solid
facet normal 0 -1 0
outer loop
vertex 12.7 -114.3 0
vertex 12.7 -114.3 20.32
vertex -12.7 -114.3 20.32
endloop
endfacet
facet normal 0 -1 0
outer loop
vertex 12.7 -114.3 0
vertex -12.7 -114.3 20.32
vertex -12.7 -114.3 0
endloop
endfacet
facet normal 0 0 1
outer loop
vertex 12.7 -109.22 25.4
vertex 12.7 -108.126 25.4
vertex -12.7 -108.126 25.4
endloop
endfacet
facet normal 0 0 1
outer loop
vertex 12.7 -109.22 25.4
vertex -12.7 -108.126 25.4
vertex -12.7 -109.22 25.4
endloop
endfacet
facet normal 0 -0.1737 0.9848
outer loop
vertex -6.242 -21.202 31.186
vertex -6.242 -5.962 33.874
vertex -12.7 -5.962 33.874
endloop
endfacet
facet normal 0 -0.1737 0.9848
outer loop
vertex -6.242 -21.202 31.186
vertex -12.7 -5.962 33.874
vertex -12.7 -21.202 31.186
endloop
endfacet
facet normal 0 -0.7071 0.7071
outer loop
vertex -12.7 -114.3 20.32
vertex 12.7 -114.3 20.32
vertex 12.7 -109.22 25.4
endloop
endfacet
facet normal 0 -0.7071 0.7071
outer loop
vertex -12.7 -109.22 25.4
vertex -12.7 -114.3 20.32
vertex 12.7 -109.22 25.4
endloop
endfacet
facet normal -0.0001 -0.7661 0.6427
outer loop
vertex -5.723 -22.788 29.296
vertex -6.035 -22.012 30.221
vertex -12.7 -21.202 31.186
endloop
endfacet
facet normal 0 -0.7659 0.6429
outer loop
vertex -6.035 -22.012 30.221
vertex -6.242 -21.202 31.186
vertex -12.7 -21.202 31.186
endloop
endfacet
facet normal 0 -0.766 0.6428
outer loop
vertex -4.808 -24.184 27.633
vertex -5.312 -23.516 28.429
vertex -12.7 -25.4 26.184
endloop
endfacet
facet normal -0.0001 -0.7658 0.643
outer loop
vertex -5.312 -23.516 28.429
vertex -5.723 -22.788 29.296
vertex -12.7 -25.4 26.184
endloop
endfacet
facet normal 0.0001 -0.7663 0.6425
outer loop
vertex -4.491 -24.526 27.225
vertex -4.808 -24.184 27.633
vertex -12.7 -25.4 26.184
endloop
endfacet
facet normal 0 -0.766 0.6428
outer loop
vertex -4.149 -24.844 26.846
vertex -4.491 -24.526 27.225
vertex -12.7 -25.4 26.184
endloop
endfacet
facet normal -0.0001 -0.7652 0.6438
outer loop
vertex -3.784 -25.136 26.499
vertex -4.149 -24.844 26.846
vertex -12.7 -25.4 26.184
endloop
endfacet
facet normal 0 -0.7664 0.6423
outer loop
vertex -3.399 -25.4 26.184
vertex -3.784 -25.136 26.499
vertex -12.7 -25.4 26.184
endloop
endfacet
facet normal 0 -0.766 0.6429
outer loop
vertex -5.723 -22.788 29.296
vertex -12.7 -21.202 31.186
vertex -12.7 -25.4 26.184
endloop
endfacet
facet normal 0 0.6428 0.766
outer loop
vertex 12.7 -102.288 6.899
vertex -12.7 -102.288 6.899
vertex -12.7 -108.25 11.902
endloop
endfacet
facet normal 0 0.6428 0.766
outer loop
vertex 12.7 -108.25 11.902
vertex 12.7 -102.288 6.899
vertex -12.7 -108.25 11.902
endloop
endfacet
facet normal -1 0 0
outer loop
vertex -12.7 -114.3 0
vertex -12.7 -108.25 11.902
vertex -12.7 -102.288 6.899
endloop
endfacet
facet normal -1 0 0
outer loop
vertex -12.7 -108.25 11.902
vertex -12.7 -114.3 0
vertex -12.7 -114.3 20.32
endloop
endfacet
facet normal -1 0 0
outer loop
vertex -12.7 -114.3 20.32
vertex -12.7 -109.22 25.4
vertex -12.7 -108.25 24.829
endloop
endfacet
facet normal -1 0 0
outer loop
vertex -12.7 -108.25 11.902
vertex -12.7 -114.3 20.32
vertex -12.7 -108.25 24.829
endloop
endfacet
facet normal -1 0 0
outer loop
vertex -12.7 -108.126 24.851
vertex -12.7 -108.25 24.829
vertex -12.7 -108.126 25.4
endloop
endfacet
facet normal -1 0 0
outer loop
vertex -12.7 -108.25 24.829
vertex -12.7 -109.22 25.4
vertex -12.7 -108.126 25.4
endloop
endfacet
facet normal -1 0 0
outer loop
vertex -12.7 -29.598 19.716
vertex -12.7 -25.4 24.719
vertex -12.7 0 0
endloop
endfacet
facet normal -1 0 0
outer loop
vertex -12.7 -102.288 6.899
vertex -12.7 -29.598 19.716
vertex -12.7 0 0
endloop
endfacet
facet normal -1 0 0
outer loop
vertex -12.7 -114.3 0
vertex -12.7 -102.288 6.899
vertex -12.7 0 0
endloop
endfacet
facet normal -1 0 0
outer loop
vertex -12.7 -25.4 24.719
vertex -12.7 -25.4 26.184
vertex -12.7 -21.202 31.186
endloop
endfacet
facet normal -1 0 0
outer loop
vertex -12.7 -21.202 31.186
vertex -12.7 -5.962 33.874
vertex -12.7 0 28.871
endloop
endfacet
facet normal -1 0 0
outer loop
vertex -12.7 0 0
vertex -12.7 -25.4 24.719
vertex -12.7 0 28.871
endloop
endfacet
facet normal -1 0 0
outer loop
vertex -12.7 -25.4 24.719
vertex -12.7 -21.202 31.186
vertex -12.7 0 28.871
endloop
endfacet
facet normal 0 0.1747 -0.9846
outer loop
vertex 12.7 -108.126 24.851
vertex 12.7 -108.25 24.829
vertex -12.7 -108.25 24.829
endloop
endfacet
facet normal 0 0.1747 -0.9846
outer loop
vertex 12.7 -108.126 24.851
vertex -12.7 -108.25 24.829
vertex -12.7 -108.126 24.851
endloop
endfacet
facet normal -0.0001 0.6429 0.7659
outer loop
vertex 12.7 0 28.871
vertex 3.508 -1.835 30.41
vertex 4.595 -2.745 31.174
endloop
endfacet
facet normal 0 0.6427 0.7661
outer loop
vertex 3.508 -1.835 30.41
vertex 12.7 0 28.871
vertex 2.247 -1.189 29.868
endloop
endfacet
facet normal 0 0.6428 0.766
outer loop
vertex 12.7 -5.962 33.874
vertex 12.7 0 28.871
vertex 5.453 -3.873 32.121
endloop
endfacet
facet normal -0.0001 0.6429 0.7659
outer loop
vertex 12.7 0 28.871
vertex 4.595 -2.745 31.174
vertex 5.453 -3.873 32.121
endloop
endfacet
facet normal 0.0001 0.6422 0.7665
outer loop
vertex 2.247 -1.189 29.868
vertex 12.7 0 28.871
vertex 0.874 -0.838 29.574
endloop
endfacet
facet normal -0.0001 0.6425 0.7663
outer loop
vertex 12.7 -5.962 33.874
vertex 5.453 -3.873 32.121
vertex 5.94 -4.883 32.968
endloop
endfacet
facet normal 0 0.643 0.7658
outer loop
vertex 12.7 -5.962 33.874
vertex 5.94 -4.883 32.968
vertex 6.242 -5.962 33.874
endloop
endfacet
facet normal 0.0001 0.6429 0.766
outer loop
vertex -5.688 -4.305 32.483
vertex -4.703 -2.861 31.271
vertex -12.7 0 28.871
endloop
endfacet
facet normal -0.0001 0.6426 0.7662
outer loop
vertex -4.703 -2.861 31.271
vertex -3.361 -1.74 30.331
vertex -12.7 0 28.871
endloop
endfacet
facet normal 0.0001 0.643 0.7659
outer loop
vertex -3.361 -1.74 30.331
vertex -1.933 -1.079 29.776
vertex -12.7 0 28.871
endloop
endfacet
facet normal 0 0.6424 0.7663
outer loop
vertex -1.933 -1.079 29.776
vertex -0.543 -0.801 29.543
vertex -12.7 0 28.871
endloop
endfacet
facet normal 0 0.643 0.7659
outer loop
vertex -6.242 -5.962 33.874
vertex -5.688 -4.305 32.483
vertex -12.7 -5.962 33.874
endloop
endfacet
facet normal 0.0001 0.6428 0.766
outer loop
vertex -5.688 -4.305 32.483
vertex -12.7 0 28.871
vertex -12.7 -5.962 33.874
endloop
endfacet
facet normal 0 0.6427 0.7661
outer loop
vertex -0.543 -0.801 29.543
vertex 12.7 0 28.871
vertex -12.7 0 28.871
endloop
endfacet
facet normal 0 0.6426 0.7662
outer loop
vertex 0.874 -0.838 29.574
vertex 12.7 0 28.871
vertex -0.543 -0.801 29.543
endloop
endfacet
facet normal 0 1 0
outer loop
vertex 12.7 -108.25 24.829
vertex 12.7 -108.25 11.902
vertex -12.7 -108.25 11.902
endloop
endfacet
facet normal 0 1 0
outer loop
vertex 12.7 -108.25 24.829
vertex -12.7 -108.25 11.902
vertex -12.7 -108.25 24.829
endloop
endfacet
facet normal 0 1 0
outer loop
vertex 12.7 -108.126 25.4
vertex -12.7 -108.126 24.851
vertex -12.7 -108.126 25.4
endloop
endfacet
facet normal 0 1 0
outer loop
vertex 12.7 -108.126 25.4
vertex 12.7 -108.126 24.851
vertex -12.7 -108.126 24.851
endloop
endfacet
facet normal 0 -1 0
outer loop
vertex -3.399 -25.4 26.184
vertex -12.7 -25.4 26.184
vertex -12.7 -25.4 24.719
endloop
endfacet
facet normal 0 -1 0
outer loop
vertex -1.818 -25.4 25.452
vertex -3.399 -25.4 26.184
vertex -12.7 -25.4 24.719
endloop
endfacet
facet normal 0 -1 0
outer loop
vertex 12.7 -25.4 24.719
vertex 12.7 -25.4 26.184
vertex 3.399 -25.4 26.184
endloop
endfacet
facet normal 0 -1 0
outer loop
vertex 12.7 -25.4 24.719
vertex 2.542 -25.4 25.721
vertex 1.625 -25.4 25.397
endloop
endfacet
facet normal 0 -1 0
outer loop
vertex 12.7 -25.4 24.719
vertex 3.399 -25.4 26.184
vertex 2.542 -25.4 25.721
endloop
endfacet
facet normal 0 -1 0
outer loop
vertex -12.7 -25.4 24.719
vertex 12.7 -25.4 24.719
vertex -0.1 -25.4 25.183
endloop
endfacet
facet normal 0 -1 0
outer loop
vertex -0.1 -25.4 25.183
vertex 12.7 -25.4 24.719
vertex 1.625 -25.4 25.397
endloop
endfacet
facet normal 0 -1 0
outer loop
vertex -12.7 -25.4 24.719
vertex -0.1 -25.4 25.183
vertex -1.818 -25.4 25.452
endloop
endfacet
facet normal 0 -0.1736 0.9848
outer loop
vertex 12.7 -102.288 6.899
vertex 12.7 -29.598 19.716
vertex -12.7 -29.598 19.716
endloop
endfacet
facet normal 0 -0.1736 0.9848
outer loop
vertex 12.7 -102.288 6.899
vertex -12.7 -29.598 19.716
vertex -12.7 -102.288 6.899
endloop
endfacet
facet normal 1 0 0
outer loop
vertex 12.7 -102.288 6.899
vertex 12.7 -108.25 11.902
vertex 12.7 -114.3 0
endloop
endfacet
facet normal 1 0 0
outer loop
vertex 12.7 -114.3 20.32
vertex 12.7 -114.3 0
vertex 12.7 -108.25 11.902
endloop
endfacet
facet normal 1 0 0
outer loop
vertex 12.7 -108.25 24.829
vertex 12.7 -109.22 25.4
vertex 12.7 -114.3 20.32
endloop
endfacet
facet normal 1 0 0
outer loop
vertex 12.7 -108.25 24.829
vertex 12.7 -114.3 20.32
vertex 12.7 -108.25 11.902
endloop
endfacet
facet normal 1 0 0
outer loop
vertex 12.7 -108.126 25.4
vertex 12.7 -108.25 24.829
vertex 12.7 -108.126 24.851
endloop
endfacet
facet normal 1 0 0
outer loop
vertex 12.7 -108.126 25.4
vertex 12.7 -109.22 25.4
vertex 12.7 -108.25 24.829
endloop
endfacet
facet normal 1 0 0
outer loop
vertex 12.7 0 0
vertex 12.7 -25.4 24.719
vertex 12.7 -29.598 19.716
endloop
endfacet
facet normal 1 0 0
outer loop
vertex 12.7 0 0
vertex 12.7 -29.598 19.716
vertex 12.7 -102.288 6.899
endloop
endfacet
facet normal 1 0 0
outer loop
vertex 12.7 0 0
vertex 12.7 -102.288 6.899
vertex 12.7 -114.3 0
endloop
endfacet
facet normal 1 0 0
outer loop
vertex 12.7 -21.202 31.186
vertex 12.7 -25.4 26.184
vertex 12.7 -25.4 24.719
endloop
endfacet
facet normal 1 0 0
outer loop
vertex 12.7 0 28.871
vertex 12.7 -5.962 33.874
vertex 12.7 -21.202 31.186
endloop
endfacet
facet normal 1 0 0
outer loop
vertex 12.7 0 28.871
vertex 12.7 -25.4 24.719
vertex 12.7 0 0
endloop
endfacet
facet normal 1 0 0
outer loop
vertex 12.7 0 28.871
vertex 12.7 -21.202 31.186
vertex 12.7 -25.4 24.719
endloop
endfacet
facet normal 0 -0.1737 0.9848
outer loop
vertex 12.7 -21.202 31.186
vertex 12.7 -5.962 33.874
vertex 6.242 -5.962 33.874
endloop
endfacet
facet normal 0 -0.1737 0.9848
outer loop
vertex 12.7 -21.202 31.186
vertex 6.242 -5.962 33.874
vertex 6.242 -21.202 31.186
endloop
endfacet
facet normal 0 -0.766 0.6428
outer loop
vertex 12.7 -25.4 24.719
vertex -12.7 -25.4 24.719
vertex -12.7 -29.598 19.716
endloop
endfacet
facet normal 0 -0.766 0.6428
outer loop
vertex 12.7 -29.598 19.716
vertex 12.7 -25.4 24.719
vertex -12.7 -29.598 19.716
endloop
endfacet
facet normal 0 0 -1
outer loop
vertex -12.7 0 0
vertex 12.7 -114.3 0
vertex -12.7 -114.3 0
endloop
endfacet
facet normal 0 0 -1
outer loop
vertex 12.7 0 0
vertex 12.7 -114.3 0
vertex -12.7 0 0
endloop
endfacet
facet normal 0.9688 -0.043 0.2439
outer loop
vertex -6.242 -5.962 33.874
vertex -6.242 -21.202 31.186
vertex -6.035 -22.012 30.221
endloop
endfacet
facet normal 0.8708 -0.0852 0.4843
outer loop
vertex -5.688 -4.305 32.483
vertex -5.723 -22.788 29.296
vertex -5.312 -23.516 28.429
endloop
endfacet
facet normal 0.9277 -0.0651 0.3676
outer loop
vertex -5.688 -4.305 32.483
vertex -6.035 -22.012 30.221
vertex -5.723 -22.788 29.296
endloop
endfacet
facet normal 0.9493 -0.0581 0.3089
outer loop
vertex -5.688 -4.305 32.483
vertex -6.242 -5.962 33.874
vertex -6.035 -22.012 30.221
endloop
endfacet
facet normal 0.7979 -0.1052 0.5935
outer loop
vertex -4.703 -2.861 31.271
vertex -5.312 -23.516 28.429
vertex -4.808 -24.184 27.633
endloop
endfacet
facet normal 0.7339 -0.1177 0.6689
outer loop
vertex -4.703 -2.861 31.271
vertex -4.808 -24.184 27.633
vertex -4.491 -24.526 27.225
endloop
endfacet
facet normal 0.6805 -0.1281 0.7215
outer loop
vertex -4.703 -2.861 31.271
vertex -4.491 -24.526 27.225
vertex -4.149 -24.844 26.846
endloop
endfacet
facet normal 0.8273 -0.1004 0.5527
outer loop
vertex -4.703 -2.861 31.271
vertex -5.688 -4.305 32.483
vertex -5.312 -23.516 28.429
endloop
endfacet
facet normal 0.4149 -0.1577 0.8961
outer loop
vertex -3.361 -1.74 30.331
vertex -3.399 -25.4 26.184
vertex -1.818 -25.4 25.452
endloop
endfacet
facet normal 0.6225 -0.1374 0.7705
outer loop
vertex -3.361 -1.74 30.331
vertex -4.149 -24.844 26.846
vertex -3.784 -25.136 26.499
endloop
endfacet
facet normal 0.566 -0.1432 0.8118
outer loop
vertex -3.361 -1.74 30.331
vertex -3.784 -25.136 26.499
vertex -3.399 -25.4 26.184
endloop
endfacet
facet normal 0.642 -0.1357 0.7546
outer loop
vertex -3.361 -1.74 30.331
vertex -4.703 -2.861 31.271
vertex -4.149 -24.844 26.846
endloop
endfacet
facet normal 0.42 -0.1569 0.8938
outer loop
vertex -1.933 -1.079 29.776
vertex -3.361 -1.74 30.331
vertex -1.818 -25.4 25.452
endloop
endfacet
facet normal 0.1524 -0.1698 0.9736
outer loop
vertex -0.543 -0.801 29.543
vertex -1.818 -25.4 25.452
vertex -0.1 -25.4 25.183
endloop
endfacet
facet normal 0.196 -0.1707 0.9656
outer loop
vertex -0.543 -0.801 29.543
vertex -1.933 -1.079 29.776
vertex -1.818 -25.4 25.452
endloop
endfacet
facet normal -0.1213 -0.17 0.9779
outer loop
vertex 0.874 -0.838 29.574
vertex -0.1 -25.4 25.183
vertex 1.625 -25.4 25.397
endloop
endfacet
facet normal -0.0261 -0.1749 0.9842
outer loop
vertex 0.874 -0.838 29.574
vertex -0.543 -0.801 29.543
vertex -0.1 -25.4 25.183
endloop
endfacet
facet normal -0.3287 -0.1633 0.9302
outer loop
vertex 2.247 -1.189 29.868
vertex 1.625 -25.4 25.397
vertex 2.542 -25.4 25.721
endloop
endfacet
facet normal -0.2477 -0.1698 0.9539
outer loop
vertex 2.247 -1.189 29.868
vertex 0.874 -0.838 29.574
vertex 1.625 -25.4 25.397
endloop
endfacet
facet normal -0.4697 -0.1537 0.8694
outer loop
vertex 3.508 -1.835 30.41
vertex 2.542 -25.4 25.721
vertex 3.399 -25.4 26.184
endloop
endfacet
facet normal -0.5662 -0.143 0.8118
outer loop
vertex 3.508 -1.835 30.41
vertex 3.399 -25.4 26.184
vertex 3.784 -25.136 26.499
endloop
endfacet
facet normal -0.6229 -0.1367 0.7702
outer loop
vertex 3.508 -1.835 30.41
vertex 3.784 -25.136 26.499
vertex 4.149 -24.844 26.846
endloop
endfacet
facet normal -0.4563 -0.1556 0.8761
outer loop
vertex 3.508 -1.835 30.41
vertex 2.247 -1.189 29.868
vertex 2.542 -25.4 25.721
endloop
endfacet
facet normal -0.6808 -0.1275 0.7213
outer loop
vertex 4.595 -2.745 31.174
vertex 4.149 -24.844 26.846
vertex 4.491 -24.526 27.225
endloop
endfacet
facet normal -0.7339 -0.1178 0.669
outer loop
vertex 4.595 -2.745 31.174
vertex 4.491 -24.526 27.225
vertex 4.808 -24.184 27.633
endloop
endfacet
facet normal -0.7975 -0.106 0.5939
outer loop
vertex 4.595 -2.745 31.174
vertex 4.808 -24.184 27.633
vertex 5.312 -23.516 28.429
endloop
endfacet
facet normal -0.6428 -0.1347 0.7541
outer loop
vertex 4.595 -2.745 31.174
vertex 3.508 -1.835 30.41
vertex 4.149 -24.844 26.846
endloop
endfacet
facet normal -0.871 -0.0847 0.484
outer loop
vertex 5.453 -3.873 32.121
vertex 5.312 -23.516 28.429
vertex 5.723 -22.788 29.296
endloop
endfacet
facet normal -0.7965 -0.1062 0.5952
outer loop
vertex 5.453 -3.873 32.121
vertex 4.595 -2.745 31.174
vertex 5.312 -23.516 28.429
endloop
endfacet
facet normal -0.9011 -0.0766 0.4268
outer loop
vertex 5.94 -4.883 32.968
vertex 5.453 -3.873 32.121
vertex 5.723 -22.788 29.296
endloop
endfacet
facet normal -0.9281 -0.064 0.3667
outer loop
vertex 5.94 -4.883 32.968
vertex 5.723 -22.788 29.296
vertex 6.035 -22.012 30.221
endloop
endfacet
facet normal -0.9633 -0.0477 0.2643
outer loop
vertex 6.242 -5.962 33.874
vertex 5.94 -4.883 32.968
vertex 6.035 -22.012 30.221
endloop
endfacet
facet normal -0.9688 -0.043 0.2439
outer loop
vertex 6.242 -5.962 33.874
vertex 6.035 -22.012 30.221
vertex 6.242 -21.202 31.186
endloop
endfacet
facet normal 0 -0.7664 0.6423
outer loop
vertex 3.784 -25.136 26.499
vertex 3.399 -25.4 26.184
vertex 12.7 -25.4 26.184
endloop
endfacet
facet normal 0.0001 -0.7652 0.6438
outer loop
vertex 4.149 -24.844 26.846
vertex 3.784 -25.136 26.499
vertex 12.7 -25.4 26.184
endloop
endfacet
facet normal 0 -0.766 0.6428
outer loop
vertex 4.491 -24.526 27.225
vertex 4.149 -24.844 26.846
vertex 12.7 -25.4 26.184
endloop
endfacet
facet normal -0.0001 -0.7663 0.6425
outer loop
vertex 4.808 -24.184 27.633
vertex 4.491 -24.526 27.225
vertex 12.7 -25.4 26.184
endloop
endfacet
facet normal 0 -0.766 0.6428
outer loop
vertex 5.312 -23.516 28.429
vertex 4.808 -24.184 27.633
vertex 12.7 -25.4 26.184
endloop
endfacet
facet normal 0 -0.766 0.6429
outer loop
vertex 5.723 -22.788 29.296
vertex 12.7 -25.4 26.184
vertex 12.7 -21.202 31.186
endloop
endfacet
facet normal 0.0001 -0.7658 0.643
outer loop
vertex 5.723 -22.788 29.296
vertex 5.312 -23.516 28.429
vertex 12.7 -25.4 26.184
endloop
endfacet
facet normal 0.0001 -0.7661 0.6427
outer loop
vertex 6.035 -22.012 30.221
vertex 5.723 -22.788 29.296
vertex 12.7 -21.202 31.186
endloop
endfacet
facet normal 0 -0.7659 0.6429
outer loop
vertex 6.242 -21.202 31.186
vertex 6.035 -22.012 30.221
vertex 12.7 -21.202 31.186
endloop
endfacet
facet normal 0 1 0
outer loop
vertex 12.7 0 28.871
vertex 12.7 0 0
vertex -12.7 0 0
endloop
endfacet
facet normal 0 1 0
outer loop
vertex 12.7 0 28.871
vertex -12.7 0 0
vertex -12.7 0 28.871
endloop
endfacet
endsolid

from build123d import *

# Parameters (mm, degrees)
F1_DEPTH     = 12.7
F3_R         = 6.35
F4_DEPTH     = 104.14
F5_T1_DEPTH  = 25.4
F5_T3_DEPTH  = 51.5282991577
F5_T5_DEPTH  = 37.3912990947
F5_T7_DEPTH  = 28.55897566
F5_T9_DEPTH  = 28.55897566
F5_T11_DEPTH = 37.3912990947


# Not quite as in the source:
# - a fillet or chamfer that OpenCascade refuses, or shapes differently, is made with other operations: its cross-section is extruded or revolved along the edge and cut away or added


with BuildPart() as f1:
    # F0 (on Right) → F1 (new body, symmetric)
    with BuildSketch(Plane.YZ):
        Polygon((-114.3, 25.4), (-114.3, 0), (0, 0), (0, 34.925), (-25.4, 30.44629469), (-25.4, 20.4565655141), (-108.2500742316, 5.8478620733), (-108.2500742316, 24.8292279061), (-108.1259697676, 24.8511108716), (-108.1259697676, 25.4), align=None)
    extrude(amount=F1_DEPTH, both=True)

    # F3 (on face) → F4 (cut)
    with BuildSketch(Plane(origin=(0, 5.9725267528, 1.0531176095), x_dir=(1, 0, 0), z_dir=(0, -0.984807753, -0.1736481777))):
        with Locations((0, 35.56)):
            Circle(F3_R)
    extrude(amount=F4_DEPTH, mode=Mode.SUBTRACT)

    # F5: chamfer of 5.08 on 7 edges, made by hand

    # F5_s2 → F5_t1 (join)
    with BuildSketch(Plane.YZ.offset(-12.7)):
        Polygon((-25.4, 24.7191916404), (-29.5978672575, 19.7163682551), (-25.4, 20.4565655141), align=None)
        Polygon((-102.2879414891, 6.8991469384), (-108.2500742316, 11.9019703237), (-108.2500742316, 5.8478620733), align=None)
    extrude(amount=F5_T1_DEPTH)

    # F5_s4 → F5_t3 (cut)
    with BuildSketch(Plane.YZ.offset(-25.7641495789)):
        Polygon((-114.3, 20.32), (-109.22, 25.4), (-114.3, 25.4), align=None)
    extrude(amount=F5_T3_DEPTH, mode=Mode.SUBTRACT)

    # F5_s6 → F5_t5 (cut)
    with BuildSketch(Plane.YZ.offset(-28.1667031257)):
        Polygon((0, 28.8708917496), (-5.9621327425, 33.8737151349), (0, 34.925), align=None)
    extrude(amount=F5_T5_DEPTH, mode=Mode.SUBTRACT)

    # F5_s8 → F5_t7 (cut)
    with BuildSketch(Plane.YZ.offset(-4.8084342517)):
        Polygon((-25.4, 26.1836685636), (-21.2021327425, 31.1864919489), (-25.4, 30.44629469), align=None)
    extrude(amount=F5_T7_DEPTH, mode=Mode.SUBTRACT)

    # F5_s10 → F5_t9 (cut)
    with BuildSketch(Plane.YZ.offset(-23.7505414084)):
        Polygon((-21.2021327425, 31.1864919489), (-25.4, 26.1836685636), (-25.4, 30.44629469), align=None)
    extrude(amount=F5_T9_DEPTH, mode=Mode.SUBTRACT)

    # F5_s12 → F5_t11 (cut)
    with BuildSketch(Plane.YZ.offset(-9.224595969)):
        Polygon((0, 28.8708917496), (-5.9621327425, 33.8737151349), (0, 34.925), align=None)
    extrude(amount=F5_T11_DEPTH, mode=Mode.SUBTRACT)


solid = f1.part
